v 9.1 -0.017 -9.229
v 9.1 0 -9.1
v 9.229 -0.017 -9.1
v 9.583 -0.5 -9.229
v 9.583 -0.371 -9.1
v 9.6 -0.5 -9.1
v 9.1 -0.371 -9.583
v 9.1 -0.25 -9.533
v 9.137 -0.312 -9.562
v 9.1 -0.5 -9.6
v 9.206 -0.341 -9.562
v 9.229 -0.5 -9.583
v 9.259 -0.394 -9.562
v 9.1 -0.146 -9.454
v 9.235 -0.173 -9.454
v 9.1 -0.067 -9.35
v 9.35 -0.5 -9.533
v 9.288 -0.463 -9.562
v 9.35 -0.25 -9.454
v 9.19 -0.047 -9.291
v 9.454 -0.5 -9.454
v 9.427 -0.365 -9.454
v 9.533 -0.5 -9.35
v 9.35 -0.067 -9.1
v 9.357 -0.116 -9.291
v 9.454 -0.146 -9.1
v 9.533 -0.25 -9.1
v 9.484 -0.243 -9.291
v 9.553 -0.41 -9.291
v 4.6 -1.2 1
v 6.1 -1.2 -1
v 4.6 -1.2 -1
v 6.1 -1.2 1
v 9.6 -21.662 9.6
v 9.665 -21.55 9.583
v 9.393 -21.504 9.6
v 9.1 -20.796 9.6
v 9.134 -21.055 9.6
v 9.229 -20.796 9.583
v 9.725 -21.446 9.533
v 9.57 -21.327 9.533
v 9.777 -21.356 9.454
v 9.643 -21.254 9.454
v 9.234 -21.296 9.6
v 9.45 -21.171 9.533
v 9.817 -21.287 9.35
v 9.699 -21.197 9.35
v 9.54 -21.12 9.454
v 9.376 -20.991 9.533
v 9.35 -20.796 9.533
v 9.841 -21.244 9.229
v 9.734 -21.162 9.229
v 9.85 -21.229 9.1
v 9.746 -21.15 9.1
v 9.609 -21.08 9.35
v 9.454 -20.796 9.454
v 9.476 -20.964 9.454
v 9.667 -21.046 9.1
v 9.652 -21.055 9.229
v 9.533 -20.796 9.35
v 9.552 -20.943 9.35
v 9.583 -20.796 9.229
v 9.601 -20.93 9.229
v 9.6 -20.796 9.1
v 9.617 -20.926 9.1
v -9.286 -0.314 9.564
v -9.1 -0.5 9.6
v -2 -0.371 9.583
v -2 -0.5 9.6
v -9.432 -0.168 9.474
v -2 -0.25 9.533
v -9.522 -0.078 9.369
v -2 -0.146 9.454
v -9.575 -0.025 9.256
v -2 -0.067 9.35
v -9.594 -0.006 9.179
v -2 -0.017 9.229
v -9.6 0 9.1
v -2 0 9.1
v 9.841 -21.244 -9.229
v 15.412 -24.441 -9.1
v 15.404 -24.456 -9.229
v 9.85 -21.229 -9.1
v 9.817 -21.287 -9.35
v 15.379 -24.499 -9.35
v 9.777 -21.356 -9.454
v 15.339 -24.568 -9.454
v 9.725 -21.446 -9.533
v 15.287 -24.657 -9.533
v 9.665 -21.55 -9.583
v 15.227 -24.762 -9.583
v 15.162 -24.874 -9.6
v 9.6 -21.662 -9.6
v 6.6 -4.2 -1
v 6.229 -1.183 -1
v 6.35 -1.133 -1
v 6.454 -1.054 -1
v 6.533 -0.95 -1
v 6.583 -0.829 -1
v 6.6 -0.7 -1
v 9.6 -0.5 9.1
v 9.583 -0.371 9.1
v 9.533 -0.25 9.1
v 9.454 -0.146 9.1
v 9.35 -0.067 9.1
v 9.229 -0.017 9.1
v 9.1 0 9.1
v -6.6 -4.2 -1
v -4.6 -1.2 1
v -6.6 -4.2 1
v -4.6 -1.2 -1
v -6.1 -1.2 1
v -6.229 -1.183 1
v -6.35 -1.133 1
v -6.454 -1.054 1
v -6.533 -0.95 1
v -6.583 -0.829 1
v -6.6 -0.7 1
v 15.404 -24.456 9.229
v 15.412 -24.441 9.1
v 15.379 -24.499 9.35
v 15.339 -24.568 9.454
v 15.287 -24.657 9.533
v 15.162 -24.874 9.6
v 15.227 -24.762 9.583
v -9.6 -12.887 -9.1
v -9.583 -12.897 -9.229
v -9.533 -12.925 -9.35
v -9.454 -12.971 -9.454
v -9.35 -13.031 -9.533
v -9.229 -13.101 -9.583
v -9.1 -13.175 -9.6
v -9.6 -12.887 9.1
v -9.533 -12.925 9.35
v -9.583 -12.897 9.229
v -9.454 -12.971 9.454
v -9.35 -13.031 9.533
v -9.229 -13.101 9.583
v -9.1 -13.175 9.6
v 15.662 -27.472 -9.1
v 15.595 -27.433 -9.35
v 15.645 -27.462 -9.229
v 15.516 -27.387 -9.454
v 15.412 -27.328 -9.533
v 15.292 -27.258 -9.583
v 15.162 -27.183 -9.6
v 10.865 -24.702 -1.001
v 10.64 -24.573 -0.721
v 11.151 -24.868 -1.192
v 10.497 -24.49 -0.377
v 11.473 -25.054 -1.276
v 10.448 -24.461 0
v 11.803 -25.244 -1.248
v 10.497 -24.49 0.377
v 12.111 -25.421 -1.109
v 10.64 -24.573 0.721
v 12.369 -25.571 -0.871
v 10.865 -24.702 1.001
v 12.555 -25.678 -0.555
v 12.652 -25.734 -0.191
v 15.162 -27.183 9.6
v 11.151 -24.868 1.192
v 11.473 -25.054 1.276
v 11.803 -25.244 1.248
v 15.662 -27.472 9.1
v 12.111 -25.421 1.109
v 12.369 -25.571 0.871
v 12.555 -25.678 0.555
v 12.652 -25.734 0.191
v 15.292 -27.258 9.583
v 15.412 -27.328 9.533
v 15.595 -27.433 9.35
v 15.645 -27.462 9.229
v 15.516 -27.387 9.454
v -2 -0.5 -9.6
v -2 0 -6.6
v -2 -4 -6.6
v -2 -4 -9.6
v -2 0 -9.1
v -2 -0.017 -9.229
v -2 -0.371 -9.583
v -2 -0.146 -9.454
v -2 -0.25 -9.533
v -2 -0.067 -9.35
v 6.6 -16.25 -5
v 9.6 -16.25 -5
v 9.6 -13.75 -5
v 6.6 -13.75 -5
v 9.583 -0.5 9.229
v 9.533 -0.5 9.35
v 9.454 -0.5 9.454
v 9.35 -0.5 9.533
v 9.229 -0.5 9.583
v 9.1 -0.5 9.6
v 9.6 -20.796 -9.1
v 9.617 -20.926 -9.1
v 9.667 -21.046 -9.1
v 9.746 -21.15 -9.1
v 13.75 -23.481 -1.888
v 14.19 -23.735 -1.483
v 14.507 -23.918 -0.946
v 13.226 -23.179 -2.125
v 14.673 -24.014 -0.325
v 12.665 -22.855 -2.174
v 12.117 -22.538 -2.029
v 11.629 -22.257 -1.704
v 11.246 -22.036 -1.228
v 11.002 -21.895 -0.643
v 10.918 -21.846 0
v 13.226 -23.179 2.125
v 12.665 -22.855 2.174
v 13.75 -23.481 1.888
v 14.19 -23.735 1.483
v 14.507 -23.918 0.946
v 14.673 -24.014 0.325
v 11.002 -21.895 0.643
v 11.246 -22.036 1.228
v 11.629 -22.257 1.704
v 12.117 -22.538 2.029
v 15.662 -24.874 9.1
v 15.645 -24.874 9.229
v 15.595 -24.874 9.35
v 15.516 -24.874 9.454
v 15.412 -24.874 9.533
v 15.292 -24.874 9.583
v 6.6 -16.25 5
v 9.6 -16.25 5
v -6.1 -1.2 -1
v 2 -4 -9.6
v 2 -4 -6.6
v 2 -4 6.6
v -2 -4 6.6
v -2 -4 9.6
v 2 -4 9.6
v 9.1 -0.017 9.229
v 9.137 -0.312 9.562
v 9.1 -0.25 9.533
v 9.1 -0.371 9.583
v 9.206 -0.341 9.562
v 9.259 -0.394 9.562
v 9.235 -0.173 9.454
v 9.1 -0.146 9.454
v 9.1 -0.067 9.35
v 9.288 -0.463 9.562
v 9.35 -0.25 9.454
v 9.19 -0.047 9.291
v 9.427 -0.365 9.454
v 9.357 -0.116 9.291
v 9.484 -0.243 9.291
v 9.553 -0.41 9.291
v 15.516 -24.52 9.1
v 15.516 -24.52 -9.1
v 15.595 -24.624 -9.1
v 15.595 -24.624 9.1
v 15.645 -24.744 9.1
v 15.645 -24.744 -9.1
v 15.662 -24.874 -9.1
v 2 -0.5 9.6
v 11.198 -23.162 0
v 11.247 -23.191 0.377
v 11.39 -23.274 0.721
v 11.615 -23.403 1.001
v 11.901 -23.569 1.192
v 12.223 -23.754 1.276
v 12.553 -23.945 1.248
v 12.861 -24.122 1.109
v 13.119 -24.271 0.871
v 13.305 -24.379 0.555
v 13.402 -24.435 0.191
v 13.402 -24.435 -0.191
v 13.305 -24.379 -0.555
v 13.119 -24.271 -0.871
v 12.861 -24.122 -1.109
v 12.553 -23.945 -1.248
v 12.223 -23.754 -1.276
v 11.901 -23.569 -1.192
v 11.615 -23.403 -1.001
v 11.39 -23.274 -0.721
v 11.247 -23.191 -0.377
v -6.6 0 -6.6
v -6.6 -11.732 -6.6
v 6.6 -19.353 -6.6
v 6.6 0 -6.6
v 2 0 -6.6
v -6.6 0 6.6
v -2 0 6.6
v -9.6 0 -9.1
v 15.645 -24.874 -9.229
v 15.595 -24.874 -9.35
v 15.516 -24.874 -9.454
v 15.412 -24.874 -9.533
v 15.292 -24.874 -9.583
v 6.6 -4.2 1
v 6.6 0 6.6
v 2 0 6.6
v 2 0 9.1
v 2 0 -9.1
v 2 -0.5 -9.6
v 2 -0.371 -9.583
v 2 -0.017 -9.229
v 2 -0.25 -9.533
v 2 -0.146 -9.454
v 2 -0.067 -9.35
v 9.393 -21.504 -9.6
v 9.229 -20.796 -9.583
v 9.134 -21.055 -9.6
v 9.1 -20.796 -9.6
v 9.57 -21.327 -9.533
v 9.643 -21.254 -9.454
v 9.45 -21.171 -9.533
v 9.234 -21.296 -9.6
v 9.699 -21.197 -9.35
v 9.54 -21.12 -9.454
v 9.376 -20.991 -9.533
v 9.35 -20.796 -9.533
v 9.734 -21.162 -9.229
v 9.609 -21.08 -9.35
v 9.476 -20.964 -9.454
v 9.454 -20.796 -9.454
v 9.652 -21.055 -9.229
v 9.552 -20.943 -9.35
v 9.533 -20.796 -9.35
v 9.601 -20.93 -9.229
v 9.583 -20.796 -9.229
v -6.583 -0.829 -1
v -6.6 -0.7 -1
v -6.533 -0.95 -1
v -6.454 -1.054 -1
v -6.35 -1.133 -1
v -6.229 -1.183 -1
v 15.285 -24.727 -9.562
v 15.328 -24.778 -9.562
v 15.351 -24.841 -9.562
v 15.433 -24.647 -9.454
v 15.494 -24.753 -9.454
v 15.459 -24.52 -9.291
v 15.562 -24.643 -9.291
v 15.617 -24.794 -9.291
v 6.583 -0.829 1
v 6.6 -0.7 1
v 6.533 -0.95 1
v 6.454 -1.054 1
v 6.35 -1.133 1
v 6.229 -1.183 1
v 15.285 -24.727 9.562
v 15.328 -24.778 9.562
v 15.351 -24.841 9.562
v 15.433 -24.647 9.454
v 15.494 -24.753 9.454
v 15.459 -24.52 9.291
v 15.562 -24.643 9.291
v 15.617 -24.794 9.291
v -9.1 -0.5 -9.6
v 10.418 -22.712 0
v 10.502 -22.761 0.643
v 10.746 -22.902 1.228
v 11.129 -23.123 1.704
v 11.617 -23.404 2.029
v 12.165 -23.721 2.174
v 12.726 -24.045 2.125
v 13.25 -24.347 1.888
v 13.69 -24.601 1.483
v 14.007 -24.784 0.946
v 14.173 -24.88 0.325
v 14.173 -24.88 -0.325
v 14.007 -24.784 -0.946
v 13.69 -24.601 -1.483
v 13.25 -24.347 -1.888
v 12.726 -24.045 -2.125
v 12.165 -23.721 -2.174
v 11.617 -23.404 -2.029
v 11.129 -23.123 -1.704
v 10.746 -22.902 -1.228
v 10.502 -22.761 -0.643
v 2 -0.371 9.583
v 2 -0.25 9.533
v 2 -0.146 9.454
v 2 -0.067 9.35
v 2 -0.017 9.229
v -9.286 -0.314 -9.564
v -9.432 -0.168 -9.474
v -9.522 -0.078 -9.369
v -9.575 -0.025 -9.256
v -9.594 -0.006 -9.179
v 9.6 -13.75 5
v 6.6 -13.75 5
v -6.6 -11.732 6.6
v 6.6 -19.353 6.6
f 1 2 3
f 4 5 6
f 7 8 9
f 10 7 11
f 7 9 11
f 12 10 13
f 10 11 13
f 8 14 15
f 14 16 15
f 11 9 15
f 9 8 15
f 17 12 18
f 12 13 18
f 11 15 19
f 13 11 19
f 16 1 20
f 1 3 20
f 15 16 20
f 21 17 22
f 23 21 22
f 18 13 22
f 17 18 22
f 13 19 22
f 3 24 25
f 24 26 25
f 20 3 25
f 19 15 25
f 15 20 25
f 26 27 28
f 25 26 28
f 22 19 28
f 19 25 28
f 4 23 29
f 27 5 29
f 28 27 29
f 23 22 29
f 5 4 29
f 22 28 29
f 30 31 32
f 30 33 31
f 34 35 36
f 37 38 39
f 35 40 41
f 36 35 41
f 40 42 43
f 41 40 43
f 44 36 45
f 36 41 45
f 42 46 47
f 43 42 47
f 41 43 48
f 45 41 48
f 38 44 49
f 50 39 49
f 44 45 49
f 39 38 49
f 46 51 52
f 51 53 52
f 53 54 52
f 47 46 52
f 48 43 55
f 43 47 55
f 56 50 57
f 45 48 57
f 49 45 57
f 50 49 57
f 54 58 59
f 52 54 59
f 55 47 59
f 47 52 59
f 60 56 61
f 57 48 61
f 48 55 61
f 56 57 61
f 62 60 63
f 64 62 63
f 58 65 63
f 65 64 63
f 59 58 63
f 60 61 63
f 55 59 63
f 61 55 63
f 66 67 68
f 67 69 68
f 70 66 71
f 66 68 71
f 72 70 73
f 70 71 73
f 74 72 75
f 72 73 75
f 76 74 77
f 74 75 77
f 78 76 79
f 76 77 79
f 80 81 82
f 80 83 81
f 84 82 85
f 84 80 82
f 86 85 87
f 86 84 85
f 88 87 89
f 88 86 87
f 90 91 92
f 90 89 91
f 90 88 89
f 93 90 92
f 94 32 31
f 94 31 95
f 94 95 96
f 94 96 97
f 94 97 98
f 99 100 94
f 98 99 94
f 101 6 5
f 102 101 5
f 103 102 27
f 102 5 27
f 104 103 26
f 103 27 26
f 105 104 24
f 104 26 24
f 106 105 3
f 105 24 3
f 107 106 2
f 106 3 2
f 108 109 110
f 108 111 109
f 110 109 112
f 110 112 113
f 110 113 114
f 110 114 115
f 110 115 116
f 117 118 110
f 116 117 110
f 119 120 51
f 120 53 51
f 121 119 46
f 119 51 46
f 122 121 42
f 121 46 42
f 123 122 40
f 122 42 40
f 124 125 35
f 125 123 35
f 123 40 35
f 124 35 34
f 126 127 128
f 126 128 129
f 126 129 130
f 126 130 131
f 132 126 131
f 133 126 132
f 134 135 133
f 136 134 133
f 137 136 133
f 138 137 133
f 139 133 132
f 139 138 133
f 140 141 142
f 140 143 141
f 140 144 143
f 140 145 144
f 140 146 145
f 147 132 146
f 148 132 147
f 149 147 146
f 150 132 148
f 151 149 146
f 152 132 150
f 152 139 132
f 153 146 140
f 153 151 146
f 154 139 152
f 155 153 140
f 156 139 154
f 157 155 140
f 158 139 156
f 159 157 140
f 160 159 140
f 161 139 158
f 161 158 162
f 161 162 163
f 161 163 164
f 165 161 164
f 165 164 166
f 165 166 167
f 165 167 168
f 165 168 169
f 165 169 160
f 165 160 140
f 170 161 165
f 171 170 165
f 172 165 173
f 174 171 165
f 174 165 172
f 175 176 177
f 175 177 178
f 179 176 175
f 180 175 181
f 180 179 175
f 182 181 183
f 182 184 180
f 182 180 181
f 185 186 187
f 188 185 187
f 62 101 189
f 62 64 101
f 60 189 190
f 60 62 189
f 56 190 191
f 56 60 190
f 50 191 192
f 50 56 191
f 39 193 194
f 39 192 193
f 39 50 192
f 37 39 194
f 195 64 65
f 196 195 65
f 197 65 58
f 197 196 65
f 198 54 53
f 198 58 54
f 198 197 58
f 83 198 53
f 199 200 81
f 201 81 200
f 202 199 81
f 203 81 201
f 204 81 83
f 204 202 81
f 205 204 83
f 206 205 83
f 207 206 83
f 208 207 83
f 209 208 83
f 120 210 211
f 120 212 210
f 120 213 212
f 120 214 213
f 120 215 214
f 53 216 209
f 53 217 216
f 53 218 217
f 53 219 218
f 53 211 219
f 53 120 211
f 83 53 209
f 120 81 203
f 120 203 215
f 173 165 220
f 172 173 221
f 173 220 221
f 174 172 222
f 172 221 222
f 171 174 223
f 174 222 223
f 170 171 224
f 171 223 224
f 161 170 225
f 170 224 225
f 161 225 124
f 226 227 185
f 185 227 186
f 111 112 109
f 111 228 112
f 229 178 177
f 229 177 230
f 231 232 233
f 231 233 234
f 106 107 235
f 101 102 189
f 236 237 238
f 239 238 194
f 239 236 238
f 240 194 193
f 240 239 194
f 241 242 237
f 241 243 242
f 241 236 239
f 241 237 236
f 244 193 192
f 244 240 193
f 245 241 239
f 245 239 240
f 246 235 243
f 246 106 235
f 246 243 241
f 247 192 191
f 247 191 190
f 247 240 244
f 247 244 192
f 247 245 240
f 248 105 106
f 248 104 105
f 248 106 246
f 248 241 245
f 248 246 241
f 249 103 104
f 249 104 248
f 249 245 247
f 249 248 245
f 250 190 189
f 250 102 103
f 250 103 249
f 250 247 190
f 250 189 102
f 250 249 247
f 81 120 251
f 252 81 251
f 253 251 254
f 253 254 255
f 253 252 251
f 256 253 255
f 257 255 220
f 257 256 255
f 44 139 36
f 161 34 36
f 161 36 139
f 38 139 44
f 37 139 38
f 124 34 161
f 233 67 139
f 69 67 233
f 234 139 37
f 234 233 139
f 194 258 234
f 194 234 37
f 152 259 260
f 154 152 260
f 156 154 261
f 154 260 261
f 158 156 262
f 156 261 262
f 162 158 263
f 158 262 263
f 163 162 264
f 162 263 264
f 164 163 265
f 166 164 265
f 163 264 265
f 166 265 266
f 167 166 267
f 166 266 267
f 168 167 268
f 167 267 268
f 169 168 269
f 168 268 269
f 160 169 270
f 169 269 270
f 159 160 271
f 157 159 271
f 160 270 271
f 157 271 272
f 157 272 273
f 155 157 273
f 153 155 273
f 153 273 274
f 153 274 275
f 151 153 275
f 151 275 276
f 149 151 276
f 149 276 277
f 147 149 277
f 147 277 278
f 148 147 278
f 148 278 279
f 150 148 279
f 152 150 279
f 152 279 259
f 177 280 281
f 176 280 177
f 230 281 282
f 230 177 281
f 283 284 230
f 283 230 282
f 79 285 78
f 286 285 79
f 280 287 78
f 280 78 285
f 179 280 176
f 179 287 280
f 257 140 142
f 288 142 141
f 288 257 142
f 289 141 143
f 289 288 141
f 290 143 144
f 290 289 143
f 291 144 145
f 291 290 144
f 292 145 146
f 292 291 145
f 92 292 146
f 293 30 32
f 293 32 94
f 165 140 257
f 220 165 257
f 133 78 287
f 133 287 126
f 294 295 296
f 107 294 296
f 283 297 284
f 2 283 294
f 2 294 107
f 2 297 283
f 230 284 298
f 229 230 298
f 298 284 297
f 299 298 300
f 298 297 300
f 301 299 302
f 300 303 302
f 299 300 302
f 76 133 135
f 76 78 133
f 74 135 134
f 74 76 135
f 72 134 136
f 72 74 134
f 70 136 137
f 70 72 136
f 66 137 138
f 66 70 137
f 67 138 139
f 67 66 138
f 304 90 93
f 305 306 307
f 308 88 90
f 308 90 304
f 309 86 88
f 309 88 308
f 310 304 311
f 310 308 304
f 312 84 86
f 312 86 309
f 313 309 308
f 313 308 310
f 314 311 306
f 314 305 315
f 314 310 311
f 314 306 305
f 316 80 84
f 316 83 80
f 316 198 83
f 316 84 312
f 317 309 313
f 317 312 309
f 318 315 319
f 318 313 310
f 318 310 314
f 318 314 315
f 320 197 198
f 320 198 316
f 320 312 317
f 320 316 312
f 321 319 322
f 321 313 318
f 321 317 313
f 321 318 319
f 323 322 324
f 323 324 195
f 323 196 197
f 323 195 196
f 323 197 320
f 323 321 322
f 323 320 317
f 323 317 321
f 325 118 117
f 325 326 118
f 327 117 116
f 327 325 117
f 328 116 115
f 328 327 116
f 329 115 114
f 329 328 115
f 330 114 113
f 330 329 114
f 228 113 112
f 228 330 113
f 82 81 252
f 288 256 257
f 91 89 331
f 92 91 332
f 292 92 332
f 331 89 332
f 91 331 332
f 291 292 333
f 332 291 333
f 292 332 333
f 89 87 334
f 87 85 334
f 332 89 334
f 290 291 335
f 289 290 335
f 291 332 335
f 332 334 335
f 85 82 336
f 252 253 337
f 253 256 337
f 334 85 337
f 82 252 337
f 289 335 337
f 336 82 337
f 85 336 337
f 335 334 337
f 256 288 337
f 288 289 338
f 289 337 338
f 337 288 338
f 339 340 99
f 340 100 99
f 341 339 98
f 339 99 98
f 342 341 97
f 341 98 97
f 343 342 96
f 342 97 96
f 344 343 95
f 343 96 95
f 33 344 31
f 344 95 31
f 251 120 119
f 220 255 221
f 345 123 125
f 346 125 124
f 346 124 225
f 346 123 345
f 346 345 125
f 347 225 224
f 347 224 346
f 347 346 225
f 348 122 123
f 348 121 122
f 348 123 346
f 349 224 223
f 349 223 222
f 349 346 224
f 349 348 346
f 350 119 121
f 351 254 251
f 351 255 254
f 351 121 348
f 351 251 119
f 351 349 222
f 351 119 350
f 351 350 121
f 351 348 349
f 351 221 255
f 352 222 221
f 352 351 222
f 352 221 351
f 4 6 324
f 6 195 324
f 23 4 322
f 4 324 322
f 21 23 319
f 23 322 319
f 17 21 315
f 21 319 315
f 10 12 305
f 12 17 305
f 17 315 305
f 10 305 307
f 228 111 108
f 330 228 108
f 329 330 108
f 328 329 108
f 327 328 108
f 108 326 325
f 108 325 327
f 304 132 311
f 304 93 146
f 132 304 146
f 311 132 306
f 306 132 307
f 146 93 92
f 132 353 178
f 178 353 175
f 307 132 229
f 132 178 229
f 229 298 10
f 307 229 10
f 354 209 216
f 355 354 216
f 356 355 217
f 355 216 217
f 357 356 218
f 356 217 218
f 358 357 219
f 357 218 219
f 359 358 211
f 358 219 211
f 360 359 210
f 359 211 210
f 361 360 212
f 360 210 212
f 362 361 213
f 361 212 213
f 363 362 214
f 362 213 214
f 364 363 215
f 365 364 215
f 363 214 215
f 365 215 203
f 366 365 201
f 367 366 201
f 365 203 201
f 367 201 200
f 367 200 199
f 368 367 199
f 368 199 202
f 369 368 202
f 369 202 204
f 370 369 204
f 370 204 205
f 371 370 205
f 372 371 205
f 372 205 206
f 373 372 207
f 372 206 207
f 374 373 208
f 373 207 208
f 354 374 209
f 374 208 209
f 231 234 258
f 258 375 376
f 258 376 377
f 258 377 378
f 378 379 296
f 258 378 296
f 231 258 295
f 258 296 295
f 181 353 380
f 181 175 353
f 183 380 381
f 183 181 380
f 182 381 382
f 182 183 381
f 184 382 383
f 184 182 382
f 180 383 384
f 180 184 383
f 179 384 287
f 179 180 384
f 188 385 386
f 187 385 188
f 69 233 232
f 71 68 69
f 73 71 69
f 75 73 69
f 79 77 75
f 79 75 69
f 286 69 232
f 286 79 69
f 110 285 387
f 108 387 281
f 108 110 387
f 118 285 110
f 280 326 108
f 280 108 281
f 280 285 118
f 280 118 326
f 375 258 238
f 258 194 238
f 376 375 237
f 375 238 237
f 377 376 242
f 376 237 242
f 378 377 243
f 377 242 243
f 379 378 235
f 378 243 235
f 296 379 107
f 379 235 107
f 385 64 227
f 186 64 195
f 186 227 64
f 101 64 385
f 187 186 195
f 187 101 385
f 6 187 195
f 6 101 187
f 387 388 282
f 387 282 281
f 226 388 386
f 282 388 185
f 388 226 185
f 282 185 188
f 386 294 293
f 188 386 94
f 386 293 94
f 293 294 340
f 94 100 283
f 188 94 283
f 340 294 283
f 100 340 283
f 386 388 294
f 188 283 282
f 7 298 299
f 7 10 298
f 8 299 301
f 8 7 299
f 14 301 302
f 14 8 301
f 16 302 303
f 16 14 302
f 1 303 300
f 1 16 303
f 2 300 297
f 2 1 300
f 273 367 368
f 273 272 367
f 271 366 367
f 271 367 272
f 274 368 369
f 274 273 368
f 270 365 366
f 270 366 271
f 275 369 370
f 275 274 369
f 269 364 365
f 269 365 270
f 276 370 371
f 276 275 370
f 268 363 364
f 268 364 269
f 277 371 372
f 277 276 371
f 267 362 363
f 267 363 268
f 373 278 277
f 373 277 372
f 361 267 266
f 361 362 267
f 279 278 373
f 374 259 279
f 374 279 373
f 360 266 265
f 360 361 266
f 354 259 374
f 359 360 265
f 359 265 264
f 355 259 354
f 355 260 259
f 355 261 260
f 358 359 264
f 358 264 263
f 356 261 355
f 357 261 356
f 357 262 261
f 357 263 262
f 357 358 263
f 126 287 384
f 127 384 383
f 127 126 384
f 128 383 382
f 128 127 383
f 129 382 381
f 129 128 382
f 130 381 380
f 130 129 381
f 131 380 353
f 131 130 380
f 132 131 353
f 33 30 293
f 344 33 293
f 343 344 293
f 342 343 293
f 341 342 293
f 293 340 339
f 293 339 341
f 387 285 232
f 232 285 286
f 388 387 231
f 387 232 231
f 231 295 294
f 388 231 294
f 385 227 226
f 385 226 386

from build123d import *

# Parameters (mm, degrees)
SKETCH1_W           = 19.2
SKETCH1_H           = 19.2
SKETCH1_W_2         = 13.2
SKETCH1_H_2         = 13.2
BOSS_EXTRUDE1_DEPTH = 30
CUT_EXTRUDE1_DEPTH  = 30
BOSS_EXTRUDE2_DEPTH = 19.2
SKETCH4_R           = 1.28
CUT_EXTRUDE2_DEPTH  = 30
SKETCH5_R           = 2.18
CUT_EXTRUDE3_DEPTH  = 1
SKETCH6_W           = 10
SKETCH6_H           = 2.5
CUT_EXTRUDE4_DEPTH  = 3
BOSS_EXTRUDE3_DEPTH = 1
SKETCH8_W           = 4
SKETCH8_H           = 3
CUT_EXTRUDE5_DEPTH  = 4
FILLET1_R           = 0.5
FILLET2_R           = 0.5


with BuildPart() as part:
    # Sketch1 → Boss-Extrude1 (new body)
    with BuildSketch(Plane(origin=(0, 0, 0), x_dir=(1, 0, 0), z_dir=(0, 1, 0))):
        Rectangle(SKETCH1_W, SKETCH1_H)
        Rectangle(SKETCH1_W_2, SKETCH1_H_2, mode=Mode.SUBTRACT)
    extrude(amount=-BOSS_EXTRUDE1_DEPTH)

    # Sketch2 → Cut-Extrude1 (cut)
    with BuildSketch(Plane.XY.offset(9.6)):
        Polygon((-9.6, -30), (-9.6, -10), (25.041016151, -30), align=None)
    extrude(amount=-CUT_EXTRUDE1_DEPTH, mode=Mode.SUBTRACT)

    # Sketch3 → Boss-Extrude2 (add)
    with BuildSketch(Plane.XY.offset(9.6)):
        Polygon((-9.6, -10), (-9.6, -12.886751346), (15.662177826, -27.471876514), (15.662177826, -24.585125168), align=None)
    extrude(amount=-BOSS_EXTRUDE2_DEPTH)

    # Sketch4 → Cut-Extrude2 (cut)
    with BuildSketch(Plane(origin=(-6.730127019, -11.656921938, 0), x_dir=(0.866025404, -0.5, 0), z_dir=(0.5, 0.866025404, 0))):
        with Locations(Location((22.558741962, 0, 0), (0, 0, 180))):  # turned: the seam where the file's is
            Circle(SKETCH4_R)
    extrude(amount=-CUT_EXTRUDE2_DEPTH, mode=Mode.SUBTRACT)

    # Sketch5 → Cut-Extrude3 (cut)
    with BuildSketch(Plane(origin=(-6.730127019, -11.656921938, 0), x_dir=(0.866025404, -0.5, 0), z_dir=(0.5, 0.866025404, 0))):
        with Locations(Location((22.558741962, 0, 0), (0, 0, 180))):  # turned: the seam where the file's is
            Circle(SKETCH5_R)
    extrude(amount=-CUT_EXTRUDE3_DEPTH, mode=Mode.SUBTRACT)

    # Sketch6 → Cut-Extrude4 (cut)
    with BuildSketch(Plane(origin=(9.6, 0, 0), x_dir=(0, 0, -1), z_dir=(1, 0, 0))):
        with Locations((0, -15)):
            Rectangle(SKETCH6_W, SKETCH6_H)
    extrude(amount=-CUT_EXTRUDE4_DEPTH, mode=Mode.SUBTRACT)

    # Sketch7 → Boss-Extrude3 (add, symmetric)
    with BuildSketch(Plane.XY):
        Polygon((-6.6, -4.2), (-6.6, -1.2), (-4.6, -1.2), align=None)
        Polygon((6.6, -1.2), (4.6, -1.2), (6.6, -4.2), align=None)
    extrude(amount=BOSS_EXTRUDE3_DEPTH, both=True)

    # Sketch8 → Cut-Extrude5 (cut)
    with BuildSketch(Plane(origin=(0, 0, 0), x_dir=(1, 0, 0), z_dir=(0, 1, 0))):
        with Locations((0, 8.1)):
            Rectangle(SKETCH8_W, SKETCH8_H)
        with Locations((0, -8.1)):
            Rectangle(SKETCH8_W, SKETCH8_H)
    extrude(amount=-CUT_EXTRUDE5_DEPTH, mode=Mode.SUBTRACT)

    # Fillet1
    fillet1_edges = [part.edges().sort_by_distance(p)[0] for p in [
        (-6.6, -1.2, 0),
        (6.6, -1.2, 0),
    ]]
    fillet(fillet1_edges, radius=FILLET1_R)

    # Fillet2
    fillet2_edges = [part.edges().sort_by_distance(p)[0] for p in [
        (-5.8, 0, -9.6),
        (9.6, 0, 0),
        (-5.8, 0, 9.6),
        (5.8, 0, 9.6),
        (5.8, 0, -9.6),
        (-9.6, -6.443375673, 9.6),
        (9.6, -10.542562584, 9.6),
        (9.6, -10.542562584, -9.6),
        (-9.6, -6.443375673, -9.6),
        (9.6, -21.085125168, 0),
        (15.662177826, -24.585125168, 0),
        (12.631088913, -22.835125168, 9.6),
        (15.662177826, -26.028500841, 9.6),
        (12.631088913, -22.835125168, -9.6),
        (15.662177826, -26.028500841, -9.6),
    ]]
    fillet(fillet2_edges, radius=FILLET2_R)


solid = part.part
